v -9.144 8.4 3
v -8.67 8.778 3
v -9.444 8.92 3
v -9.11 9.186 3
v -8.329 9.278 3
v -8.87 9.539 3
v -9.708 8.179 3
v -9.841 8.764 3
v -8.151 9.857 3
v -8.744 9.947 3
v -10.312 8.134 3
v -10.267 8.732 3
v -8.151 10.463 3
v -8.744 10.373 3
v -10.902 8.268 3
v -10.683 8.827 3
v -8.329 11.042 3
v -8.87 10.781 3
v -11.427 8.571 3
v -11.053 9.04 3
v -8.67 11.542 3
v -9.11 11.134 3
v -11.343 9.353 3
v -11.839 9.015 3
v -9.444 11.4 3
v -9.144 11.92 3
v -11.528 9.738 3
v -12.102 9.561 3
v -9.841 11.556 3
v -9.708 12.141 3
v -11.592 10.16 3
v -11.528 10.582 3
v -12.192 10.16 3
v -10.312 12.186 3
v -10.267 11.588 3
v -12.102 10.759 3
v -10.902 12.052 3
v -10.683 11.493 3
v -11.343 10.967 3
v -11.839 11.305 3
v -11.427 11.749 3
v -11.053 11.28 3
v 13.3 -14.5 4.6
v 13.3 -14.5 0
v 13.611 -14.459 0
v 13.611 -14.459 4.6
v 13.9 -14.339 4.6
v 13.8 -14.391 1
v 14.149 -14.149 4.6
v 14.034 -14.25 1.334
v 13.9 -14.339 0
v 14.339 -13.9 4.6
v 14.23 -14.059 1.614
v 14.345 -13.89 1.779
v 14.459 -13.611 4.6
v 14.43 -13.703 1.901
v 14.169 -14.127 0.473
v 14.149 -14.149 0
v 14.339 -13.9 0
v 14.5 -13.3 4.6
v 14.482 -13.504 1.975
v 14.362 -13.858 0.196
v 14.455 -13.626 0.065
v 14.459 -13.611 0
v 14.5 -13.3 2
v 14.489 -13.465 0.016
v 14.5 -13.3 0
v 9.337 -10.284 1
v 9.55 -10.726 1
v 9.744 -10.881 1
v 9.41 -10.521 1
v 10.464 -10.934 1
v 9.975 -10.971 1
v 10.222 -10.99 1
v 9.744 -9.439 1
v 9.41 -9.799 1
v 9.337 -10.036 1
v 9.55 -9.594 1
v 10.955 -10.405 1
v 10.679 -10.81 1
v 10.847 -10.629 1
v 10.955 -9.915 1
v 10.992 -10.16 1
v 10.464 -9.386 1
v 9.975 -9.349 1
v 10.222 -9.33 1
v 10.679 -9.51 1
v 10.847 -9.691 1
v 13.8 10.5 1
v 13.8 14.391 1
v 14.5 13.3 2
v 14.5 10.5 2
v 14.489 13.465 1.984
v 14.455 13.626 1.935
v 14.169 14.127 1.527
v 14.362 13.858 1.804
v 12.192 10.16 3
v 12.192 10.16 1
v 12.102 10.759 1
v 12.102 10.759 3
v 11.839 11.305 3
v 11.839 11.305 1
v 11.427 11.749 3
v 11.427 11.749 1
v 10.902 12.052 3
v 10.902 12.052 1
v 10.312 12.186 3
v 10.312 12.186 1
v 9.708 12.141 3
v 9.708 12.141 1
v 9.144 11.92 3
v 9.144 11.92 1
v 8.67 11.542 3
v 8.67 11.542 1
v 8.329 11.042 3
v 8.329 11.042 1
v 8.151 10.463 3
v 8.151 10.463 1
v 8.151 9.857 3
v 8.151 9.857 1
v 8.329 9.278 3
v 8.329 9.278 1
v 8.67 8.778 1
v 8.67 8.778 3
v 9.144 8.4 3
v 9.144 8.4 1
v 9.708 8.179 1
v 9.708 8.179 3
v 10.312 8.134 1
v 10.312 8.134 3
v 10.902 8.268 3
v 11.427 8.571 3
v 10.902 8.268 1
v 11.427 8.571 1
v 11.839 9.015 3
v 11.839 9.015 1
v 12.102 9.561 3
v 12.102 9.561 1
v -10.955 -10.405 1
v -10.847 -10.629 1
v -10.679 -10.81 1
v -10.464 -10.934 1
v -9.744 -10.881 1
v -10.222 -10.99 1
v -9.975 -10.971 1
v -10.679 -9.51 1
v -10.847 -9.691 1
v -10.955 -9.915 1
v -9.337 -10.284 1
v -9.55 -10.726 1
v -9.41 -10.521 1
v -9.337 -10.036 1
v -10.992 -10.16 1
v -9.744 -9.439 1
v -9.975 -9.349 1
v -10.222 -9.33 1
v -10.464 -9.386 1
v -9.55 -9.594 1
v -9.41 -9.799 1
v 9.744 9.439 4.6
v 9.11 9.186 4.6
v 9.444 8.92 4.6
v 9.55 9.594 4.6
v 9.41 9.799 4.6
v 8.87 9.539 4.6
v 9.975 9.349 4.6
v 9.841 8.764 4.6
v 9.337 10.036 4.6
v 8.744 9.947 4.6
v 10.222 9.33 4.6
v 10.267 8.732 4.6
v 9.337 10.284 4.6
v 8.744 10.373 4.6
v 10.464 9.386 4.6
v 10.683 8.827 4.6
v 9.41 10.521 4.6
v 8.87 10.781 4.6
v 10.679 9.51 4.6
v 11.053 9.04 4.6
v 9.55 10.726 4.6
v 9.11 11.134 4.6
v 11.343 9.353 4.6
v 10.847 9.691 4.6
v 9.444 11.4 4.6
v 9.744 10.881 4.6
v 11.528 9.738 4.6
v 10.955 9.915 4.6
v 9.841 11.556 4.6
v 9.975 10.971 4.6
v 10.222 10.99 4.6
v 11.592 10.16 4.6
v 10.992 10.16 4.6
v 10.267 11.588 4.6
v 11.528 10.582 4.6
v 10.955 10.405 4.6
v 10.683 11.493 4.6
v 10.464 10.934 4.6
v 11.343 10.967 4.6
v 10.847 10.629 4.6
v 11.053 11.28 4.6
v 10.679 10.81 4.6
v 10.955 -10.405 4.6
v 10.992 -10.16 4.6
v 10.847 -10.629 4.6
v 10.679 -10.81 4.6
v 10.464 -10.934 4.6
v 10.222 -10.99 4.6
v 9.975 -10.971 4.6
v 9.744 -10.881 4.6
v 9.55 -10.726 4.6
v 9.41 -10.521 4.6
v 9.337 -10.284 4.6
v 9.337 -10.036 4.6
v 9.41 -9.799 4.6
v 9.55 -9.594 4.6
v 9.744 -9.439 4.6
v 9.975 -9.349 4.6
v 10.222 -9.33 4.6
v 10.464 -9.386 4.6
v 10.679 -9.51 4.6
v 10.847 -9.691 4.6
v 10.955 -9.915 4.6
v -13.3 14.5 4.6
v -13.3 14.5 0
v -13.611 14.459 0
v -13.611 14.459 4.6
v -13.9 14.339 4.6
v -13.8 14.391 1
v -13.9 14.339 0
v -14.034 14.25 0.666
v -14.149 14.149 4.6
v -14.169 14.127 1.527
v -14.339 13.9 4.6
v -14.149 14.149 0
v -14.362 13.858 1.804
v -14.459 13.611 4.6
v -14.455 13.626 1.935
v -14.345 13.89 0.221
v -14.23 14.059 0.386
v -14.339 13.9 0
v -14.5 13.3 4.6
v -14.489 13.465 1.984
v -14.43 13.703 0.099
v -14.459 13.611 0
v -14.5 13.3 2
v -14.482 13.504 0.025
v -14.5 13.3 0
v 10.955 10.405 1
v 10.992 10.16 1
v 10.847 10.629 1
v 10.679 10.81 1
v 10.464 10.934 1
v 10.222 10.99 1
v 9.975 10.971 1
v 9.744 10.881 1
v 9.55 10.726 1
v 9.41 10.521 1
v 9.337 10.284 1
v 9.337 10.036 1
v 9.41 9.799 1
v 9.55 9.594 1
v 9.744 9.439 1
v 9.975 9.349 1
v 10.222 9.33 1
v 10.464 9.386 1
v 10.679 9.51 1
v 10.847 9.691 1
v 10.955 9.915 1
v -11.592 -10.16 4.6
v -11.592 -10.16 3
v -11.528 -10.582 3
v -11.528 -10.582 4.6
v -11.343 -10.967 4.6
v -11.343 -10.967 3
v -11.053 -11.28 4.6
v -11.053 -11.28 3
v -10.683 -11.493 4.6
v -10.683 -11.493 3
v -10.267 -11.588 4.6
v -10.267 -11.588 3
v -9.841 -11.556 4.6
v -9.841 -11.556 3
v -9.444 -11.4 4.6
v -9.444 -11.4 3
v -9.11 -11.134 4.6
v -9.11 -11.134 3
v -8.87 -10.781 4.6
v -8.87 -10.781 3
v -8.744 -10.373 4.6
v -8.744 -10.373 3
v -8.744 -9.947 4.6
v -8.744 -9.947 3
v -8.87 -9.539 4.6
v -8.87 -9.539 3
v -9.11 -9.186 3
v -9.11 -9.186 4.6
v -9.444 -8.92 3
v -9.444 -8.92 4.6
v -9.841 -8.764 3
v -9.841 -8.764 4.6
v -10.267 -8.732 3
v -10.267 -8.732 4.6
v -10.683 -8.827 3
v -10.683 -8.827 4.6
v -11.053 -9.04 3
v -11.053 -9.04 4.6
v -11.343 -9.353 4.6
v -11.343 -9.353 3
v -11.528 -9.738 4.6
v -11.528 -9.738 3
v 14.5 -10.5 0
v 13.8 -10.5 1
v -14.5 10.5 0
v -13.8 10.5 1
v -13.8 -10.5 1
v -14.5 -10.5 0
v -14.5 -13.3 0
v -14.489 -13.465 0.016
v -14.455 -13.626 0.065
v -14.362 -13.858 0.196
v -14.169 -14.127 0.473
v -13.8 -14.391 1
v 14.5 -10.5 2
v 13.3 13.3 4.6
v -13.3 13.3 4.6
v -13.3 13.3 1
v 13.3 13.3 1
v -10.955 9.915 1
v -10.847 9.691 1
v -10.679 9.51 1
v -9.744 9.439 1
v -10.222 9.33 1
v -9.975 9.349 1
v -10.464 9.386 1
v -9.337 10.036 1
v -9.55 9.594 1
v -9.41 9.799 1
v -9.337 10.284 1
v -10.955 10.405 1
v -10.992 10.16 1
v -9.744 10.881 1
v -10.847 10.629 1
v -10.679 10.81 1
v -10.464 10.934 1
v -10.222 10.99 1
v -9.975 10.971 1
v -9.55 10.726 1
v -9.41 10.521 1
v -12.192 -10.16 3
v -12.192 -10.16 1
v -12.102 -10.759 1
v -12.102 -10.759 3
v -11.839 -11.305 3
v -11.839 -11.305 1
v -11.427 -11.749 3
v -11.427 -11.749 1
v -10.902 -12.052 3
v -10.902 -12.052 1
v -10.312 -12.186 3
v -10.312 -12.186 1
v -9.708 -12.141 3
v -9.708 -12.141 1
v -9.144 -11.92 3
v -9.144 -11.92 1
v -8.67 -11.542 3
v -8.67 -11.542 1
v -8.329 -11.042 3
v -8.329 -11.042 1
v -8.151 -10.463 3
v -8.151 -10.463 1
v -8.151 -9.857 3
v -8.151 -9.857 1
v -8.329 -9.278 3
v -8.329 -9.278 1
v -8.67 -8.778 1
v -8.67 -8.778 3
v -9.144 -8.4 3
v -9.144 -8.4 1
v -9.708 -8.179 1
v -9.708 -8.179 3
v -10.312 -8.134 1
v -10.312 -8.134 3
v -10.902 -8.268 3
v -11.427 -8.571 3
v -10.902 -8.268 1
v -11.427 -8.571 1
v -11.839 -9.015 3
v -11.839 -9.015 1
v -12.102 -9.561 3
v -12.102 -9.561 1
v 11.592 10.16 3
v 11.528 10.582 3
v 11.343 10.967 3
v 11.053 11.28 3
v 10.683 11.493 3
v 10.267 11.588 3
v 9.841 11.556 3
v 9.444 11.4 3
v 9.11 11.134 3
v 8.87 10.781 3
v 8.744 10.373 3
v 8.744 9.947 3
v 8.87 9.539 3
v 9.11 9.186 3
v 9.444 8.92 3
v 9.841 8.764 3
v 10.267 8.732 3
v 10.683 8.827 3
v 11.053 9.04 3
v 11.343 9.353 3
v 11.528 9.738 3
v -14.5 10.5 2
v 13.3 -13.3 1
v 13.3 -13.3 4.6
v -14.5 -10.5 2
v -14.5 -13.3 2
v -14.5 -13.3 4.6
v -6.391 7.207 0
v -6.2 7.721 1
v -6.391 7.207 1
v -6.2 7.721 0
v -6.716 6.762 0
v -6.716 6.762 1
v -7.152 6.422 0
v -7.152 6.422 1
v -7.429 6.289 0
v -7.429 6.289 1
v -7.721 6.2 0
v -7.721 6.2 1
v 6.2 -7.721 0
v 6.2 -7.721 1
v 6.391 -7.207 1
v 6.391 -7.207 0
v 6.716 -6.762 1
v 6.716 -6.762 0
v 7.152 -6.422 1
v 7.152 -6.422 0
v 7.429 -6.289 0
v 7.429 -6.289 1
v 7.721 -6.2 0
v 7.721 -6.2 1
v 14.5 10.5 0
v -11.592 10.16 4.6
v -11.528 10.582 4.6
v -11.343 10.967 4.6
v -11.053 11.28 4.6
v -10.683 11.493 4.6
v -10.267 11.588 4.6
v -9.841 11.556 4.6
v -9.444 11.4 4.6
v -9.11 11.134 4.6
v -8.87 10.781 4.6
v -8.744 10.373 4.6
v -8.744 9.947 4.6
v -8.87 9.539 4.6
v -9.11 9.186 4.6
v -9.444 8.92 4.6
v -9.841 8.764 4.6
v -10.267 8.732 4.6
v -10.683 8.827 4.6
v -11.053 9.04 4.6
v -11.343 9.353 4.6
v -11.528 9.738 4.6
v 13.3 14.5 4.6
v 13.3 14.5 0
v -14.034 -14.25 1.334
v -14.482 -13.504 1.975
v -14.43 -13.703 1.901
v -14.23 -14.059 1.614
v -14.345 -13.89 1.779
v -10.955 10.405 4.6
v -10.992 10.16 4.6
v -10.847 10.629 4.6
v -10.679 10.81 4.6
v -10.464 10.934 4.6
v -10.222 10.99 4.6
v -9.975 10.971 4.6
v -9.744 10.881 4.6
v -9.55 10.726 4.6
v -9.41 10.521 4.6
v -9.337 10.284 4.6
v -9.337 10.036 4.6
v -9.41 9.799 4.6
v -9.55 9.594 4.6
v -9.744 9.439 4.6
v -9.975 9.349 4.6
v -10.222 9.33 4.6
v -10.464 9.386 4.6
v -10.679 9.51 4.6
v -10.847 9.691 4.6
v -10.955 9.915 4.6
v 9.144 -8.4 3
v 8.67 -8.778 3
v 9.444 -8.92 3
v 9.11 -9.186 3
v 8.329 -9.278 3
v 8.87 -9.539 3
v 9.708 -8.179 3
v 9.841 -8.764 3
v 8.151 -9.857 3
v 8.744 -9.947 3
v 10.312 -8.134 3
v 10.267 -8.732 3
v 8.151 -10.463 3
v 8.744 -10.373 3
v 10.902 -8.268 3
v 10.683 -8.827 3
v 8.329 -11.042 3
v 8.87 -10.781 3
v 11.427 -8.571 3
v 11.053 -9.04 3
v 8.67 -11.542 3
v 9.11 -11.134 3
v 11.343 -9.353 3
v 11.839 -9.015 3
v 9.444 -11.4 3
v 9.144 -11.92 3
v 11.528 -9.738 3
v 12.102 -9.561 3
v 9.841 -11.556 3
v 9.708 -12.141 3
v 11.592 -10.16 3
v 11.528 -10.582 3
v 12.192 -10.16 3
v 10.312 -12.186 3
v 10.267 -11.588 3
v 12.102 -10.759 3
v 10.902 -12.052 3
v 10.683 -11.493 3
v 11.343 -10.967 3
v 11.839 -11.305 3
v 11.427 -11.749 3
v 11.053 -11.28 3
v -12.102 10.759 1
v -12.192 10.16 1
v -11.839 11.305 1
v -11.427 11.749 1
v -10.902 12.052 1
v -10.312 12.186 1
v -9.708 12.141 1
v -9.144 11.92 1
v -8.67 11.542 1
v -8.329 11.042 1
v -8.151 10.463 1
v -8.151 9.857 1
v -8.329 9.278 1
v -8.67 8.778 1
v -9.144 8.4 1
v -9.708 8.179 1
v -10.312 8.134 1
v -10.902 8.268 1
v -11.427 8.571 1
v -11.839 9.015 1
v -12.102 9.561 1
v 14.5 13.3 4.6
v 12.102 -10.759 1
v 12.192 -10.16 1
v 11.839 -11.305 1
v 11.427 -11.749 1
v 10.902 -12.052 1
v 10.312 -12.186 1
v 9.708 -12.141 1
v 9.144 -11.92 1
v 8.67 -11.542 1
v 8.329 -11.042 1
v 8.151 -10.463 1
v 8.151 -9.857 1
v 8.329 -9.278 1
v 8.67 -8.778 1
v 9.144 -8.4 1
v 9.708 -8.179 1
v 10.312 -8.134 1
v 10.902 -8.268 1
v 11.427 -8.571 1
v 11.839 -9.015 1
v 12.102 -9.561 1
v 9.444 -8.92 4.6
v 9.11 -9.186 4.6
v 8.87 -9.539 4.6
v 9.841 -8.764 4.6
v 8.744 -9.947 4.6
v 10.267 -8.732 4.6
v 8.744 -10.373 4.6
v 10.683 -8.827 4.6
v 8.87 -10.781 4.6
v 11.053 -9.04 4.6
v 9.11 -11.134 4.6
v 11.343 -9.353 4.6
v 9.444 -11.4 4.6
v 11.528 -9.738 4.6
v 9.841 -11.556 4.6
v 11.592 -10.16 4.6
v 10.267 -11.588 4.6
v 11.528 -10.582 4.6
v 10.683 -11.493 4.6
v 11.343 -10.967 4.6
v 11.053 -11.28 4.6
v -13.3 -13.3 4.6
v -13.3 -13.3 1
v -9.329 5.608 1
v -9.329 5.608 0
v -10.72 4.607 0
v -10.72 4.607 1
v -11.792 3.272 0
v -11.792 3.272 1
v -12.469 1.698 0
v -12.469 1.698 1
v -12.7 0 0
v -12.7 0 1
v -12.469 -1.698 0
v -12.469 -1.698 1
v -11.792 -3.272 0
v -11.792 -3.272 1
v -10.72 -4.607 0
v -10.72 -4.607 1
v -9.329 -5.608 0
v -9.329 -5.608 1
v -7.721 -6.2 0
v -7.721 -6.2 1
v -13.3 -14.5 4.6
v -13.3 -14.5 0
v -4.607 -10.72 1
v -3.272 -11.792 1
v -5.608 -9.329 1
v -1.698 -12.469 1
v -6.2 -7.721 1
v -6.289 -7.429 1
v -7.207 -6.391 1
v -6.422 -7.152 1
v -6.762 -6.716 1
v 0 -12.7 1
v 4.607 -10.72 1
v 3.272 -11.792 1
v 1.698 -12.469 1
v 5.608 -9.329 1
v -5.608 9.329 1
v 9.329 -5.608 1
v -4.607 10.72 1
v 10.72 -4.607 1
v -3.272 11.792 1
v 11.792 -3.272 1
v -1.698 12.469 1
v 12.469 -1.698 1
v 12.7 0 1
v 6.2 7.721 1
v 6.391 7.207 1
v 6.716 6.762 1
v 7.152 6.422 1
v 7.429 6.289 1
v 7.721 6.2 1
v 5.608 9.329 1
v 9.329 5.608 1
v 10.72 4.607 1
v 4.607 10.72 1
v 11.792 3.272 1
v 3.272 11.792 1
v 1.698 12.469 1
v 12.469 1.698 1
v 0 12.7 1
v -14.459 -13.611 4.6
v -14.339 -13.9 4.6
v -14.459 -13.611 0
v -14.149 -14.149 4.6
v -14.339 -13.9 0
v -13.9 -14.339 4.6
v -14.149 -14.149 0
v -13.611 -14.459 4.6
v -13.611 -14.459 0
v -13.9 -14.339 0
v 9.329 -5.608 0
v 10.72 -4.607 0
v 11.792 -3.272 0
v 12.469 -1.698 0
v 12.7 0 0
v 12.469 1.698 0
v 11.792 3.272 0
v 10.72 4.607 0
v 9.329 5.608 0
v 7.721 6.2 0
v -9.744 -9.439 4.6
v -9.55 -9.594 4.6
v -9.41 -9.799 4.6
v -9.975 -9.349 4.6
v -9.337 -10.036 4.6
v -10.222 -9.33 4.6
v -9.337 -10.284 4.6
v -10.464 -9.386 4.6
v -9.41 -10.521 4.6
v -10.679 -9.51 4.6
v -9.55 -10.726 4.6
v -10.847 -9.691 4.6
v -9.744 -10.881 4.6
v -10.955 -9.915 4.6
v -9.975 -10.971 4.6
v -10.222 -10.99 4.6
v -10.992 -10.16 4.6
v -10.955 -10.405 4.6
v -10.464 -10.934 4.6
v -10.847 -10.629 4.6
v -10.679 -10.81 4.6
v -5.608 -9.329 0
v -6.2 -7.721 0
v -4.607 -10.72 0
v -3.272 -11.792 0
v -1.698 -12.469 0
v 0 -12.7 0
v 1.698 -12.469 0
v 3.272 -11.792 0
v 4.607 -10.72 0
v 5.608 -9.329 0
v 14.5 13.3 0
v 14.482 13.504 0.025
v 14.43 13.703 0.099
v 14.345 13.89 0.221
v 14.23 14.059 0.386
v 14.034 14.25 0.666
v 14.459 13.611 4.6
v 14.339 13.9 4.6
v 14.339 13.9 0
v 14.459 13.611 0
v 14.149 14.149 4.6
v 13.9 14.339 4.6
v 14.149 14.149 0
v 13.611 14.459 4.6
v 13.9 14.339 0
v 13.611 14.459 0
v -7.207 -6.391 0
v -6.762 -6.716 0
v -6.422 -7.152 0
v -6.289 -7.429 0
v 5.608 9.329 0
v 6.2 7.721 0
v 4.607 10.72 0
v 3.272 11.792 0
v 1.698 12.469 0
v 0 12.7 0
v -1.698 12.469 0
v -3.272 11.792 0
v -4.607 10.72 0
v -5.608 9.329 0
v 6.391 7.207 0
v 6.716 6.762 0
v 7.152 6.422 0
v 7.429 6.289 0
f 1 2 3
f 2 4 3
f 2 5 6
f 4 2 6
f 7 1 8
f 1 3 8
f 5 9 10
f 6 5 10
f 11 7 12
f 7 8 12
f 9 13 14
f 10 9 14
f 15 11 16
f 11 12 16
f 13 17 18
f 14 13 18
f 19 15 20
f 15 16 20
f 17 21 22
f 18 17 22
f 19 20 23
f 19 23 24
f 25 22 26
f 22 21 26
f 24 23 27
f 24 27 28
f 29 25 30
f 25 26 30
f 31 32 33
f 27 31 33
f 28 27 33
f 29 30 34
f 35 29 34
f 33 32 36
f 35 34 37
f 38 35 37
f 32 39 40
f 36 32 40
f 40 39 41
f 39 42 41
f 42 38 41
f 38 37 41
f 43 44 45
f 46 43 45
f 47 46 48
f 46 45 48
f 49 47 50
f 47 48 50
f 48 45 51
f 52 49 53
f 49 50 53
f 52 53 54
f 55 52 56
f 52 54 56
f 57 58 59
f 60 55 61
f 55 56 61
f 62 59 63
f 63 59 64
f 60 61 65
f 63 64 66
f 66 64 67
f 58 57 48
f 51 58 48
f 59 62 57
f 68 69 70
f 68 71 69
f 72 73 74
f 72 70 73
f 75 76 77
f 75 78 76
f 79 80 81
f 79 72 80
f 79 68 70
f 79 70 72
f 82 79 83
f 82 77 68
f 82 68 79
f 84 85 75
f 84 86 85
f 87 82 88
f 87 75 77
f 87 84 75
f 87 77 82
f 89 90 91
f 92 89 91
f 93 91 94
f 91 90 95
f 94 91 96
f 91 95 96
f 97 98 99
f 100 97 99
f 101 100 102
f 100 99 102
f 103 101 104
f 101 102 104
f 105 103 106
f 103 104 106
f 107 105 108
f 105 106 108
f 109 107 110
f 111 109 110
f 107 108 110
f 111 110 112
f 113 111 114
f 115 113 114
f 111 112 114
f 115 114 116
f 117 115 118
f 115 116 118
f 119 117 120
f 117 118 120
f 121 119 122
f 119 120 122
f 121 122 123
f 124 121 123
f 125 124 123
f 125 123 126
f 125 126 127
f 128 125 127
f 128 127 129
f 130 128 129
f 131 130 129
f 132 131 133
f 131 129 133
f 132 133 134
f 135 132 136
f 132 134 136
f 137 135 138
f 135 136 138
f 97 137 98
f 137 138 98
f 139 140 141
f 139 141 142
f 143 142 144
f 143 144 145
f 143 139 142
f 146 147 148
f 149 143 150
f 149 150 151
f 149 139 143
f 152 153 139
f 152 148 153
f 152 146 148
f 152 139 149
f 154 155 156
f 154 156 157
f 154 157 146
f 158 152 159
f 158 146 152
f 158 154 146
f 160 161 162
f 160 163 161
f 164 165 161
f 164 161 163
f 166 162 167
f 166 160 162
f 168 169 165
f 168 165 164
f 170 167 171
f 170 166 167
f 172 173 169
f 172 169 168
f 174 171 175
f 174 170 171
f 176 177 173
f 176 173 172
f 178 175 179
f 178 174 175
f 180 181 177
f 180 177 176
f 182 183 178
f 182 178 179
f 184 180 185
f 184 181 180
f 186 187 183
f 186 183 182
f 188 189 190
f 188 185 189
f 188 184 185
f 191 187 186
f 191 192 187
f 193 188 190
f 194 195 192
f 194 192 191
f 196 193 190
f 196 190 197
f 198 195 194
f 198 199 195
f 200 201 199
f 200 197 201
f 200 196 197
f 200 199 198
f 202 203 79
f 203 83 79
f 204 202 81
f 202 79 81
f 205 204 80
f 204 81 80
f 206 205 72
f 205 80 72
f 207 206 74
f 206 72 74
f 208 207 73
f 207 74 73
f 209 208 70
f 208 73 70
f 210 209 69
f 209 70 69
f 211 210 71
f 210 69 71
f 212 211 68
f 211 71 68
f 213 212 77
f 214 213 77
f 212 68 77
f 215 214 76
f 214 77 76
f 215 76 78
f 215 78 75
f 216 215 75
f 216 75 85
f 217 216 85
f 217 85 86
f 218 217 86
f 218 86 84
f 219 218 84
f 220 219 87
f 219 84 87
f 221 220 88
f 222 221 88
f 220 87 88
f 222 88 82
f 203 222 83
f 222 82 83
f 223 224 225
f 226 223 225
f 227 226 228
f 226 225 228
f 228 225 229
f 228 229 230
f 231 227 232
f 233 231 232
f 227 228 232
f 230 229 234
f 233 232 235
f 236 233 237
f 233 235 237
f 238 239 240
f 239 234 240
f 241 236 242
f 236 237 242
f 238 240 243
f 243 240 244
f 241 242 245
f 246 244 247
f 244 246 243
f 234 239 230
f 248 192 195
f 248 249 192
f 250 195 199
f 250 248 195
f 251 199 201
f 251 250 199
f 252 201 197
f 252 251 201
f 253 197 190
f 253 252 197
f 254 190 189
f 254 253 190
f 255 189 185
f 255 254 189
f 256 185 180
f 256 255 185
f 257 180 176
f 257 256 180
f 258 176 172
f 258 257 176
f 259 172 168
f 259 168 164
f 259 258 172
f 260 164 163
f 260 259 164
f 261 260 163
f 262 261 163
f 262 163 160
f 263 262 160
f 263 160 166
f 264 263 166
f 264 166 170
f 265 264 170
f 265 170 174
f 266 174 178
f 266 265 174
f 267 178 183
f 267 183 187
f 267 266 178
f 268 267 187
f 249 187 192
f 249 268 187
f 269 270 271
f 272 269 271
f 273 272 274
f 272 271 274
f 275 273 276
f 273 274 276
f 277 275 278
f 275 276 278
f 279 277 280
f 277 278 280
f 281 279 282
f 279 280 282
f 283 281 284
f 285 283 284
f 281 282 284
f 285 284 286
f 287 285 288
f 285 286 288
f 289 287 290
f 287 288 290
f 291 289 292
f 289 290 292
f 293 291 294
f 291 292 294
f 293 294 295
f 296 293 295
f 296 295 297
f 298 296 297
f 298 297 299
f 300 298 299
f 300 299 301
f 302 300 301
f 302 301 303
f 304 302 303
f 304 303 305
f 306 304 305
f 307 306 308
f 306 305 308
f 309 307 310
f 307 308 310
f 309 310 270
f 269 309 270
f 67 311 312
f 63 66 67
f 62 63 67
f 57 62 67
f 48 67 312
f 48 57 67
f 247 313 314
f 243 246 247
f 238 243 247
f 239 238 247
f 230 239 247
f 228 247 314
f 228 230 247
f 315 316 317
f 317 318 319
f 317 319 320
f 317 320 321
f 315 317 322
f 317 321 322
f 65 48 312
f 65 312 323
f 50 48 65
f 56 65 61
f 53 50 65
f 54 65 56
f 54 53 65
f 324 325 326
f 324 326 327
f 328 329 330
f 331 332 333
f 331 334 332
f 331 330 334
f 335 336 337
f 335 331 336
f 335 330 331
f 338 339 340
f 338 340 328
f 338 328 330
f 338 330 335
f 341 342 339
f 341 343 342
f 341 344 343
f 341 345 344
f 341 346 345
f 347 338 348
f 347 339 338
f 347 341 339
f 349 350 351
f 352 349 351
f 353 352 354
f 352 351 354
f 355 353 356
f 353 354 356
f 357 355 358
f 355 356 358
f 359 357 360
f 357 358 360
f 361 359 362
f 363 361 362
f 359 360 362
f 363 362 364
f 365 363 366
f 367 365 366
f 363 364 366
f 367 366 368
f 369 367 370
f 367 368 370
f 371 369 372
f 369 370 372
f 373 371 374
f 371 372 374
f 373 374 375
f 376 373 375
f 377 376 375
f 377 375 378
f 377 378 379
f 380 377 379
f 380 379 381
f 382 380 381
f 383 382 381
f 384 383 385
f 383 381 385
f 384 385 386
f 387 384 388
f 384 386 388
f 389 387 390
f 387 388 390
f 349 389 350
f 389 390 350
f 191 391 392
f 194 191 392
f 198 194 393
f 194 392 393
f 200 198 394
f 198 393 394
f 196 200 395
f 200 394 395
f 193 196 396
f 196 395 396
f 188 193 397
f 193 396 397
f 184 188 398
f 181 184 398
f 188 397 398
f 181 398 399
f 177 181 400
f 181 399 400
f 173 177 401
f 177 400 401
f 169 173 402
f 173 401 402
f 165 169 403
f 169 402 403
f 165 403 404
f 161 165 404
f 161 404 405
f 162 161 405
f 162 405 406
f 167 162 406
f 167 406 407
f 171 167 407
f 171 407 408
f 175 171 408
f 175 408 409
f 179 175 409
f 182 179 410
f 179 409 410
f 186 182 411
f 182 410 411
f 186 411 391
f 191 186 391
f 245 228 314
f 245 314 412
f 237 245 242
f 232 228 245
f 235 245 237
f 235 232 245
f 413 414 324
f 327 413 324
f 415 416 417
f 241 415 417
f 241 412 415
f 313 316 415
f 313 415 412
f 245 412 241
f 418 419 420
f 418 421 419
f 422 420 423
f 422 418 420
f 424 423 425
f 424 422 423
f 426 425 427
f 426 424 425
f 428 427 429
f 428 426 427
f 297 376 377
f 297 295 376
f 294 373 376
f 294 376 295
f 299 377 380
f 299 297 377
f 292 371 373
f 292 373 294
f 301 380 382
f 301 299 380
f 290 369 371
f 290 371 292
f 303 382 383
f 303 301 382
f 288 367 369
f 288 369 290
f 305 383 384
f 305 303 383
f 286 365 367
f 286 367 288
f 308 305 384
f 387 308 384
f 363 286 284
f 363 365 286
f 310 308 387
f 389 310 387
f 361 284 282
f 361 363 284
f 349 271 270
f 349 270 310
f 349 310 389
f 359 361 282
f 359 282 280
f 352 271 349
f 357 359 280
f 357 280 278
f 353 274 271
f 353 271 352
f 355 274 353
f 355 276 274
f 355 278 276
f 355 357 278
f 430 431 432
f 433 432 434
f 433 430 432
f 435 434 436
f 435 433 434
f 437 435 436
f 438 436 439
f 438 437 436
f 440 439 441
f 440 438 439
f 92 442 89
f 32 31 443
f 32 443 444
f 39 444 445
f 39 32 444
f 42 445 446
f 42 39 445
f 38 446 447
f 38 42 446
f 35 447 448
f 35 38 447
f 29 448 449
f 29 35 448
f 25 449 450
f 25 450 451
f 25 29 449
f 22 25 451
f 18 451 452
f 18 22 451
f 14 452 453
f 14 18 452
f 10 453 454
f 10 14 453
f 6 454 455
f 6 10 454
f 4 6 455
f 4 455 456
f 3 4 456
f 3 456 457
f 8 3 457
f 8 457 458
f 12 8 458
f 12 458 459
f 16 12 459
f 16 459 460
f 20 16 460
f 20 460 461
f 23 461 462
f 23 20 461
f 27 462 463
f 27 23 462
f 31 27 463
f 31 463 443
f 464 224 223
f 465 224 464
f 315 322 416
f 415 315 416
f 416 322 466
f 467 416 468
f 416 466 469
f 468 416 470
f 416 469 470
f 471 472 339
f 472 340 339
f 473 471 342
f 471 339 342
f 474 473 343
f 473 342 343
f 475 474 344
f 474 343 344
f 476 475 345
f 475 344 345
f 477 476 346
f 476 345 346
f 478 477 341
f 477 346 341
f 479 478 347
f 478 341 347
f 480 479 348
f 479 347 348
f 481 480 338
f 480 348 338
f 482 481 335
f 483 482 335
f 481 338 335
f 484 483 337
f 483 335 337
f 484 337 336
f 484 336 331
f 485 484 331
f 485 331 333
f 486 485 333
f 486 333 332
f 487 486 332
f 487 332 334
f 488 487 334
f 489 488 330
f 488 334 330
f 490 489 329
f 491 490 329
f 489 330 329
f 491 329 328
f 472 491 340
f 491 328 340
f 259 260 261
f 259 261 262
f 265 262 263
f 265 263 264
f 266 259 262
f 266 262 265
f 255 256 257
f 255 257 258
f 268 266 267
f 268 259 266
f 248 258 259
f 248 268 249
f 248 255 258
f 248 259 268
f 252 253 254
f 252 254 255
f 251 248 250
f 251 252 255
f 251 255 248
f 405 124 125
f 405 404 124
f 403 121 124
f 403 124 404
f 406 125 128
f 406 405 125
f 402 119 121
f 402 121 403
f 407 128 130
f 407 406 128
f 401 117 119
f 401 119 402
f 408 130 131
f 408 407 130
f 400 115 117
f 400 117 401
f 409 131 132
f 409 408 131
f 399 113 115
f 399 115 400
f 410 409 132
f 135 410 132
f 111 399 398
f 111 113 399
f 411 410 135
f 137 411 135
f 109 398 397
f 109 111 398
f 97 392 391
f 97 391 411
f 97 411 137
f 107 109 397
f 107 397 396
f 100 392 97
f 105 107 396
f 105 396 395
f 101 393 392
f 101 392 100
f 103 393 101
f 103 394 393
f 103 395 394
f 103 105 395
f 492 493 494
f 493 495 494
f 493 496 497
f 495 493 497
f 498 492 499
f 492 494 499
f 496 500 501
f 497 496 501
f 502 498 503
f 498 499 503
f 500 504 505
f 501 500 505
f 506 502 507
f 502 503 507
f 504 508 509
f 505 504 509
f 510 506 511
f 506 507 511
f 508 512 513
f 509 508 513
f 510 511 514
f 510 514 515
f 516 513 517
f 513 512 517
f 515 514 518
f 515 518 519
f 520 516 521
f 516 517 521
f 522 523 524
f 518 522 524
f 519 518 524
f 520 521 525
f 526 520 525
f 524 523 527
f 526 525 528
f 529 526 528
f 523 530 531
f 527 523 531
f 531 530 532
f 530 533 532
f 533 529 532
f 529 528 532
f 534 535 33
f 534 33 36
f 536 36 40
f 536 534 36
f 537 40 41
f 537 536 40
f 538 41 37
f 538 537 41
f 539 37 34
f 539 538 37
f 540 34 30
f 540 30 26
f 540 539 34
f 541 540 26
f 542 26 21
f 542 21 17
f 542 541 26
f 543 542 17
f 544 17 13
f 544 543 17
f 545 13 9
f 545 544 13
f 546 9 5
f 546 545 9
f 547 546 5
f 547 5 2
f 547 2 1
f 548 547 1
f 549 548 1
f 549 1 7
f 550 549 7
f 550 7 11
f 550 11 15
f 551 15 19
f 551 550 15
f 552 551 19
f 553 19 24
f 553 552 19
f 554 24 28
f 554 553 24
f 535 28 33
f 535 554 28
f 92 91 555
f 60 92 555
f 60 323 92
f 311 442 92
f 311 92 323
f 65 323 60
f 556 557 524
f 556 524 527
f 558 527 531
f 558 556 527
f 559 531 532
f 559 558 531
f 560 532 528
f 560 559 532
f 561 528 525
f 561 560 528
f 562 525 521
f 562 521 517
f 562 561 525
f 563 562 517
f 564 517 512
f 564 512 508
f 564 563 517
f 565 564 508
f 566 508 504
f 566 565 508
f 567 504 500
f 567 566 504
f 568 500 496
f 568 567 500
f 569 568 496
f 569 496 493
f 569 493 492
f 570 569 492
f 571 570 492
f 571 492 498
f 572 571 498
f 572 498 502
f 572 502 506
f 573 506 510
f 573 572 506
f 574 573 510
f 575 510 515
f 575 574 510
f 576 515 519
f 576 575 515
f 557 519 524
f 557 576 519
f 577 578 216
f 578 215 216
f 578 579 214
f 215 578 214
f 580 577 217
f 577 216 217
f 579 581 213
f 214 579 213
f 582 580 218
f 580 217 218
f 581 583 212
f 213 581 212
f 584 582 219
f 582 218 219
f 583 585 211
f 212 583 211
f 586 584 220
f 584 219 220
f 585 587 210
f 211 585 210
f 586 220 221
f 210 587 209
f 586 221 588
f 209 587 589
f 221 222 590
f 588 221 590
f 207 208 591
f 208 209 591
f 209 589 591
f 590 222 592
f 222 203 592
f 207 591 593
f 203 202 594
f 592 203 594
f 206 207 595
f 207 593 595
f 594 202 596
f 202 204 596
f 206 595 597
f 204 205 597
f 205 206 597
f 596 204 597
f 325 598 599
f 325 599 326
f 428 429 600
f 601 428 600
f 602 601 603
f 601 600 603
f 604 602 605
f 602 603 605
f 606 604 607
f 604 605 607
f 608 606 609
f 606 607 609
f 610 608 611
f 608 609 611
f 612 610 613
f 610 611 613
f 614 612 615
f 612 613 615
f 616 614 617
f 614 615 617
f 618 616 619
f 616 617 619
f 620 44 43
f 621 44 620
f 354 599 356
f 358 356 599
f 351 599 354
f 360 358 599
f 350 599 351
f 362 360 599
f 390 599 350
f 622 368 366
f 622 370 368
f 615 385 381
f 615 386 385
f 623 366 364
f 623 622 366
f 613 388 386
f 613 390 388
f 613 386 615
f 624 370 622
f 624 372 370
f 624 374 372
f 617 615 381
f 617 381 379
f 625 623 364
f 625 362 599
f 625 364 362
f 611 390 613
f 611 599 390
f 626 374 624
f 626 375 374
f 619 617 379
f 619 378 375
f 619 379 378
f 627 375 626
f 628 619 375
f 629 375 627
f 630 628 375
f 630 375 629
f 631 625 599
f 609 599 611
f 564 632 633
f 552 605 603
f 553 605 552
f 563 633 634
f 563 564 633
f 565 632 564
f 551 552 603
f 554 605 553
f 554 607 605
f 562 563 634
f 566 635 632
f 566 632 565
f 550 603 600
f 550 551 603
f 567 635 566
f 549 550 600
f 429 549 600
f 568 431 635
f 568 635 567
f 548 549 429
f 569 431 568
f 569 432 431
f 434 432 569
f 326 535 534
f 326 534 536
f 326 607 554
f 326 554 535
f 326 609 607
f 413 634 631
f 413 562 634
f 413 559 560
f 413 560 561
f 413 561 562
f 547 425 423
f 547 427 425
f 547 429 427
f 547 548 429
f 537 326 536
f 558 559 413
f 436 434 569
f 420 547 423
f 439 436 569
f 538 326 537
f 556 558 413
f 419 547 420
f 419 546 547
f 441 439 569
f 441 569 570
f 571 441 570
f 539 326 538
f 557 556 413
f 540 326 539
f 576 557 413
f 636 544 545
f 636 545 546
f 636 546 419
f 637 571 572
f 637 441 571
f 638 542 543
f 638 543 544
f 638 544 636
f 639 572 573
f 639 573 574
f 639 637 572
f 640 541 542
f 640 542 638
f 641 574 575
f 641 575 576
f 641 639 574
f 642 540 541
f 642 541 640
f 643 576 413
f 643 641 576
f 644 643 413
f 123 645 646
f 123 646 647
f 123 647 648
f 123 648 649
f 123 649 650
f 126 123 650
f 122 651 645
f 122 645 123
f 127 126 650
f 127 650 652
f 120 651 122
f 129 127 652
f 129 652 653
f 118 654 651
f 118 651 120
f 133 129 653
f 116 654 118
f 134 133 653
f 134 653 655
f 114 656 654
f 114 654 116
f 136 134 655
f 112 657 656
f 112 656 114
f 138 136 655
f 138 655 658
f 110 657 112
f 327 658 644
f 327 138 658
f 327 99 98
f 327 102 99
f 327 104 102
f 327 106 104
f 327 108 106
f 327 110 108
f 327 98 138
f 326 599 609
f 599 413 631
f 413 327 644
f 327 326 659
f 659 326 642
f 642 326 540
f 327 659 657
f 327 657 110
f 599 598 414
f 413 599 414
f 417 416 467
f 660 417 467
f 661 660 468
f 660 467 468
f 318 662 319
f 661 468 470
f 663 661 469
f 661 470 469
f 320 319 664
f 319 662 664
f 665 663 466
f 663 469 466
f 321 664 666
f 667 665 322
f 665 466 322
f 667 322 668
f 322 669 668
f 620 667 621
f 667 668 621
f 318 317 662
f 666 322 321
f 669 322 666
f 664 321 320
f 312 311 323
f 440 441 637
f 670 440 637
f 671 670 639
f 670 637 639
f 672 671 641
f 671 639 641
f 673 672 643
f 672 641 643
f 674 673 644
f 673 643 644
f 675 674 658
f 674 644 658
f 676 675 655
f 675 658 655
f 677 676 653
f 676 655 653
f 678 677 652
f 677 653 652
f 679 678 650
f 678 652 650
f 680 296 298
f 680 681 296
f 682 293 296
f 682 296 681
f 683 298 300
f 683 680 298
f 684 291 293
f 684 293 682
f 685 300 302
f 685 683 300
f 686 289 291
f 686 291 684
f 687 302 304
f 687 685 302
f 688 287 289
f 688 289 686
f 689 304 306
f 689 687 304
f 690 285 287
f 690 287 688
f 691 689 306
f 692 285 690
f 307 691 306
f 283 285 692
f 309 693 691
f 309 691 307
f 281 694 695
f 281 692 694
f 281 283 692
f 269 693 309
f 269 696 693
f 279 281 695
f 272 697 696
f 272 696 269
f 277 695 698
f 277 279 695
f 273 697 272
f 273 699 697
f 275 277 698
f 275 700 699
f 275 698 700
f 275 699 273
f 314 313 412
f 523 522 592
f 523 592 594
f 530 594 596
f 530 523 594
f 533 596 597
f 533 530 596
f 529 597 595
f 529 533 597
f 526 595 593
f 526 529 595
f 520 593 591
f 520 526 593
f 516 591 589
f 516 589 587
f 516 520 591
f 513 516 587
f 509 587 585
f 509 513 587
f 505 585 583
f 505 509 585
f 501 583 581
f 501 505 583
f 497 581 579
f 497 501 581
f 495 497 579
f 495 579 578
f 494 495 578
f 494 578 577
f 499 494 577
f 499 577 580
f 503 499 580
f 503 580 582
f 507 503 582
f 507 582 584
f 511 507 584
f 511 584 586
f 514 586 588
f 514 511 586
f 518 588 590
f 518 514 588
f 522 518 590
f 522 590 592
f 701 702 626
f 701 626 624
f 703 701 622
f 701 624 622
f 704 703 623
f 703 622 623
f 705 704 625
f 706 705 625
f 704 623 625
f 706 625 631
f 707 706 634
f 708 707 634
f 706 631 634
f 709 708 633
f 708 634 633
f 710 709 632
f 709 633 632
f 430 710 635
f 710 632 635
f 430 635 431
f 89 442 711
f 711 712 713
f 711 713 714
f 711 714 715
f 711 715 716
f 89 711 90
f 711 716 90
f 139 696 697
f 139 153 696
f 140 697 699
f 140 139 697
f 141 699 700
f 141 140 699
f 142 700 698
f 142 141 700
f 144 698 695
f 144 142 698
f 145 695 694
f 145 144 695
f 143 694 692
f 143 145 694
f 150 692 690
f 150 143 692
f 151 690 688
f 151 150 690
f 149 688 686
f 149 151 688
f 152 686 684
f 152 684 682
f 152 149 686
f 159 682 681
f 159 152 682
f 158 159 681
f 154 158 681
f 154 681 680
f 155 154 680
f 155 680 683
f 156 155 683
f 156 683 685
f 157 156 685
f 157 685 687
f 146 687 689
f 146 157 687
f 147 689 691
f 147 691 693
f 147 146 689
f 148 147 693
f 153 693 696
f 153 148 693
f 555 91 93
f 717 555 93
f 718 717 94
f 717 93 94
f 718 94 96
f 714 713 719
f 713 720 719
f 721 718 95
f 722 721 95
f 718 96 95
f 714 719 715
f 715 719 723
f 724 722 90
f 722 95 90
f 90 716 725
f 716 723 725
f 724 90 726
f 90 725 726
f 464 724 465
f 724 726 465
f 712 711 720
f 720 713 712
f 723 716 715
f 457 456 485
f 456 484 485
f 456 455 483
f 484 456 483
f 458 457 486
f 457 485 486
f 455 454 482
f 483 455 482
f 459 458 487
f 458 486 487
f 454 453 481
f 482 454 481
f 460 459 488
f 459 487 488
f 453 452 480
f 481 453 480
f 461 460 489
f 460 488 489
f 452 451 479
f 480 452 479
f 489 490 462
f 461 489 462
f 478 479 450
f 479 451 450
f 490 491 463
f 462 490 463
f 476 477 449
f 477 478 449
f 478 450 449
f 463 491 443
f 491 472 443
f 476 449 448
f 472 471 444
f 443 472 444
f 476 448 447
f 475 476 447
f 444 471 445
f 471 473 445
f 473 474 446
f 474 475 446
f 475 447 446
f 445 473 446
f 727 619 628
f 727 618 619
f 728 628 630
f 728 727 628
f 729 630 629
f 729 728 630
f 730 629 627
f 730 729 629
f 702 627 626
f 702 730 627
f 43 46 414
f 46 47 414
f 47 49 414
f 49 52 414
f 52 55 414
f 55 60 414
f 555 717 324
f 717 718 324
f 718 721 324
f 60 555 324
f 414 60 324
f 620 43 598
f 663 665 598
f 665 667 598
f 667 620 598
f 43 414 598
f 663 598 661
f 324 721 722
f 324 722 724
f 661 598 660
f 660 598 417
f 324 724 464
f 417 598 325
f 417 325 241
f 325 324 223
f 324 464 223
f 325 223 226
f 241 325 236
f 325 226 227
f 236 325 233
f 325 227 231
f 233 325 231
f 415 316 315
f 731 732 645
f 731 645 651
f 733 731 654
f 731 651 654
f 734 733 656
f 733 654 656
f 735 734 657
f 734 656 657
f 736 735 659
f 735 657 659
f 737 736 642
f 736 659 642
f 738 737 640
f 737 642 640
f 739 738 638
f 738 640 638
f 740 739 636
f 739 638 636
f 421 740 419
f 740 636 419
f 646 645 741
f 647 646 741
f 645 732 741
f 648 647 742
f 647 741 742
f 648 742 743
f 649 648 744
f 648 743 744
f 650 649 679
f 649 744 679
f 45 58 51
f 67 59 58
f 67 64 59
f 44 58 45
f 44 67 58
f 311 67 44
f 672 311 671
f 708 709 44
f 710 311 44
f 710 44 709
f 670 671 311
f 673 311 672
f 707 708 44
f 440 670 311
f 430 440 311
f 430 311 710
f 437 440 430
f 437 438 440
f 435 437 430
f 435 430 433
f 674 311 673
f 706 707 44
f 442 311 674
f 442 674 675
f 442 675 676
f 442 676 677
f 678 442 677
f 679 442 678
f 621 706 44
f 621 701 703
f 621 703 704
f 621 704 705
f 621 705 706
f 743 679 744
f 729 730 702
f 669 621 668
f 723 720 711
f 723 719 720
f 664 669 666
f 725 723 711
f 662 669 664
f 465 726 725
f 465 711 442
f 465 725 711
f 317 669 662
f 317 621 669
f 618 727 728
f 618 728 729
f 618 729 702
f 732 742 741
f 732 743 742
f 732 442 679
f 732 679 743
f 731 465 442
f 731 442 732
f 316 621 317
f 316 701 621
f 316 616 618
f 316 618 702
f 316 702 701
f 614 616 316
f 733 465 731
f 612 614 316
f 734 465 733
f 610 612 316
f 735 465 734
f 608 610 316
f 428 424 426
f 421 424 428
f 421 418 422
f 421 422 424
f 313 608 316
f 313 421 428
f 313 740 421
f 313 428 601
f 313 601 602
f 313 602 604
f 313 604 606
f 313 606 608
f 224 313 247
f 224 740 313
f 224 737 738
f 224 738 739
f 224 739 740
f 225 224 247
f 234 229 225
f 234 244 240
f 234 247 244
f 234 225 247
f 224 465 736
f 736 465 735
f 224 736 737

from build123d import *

# Parameters (mm, degrees)
PAD011_DEPTH                = 4.6
SKETCH016_W                 = 26.6
SKETCH016_H                 = 26.6
POCKET005_DEPTH             = 3.6
SKETCH018_R                 = 2.032
SKETCH018_R_2               = 0.832
PAD012_DEPTH                = 2
SKETCH018_MIRRORED013_2_R   = 2.032
SKETCH018_MIRRORED013_2_R_2 = 0.832
PAD012_MIRRORED013_2_DEPTH  = 2
SKETCH_R                    = 1.432
SKETCH_R_2                  = 0.832
PAD_DEPTH                   = 1.6
SKETCH_MIRRORED023_2_R      = 1.432
SKETCH_MIRRORED023_2_R_2    = 0.832
PAD_MIRRORED023_2_DEPTH     = 1.6
POCKET007_DEPTH             = 1.001
POCKET009_DEPTH             = 4
POCKET009_MIRRORED_2_DEPTH  = 4
FILLET014_R                 = 2


with BuildPart() as part:
    # Sketch015 → Pad011 (new body)
    with BuildSketch(Plane.XY):
        with BuildLine():
            Line((-13.3, 14.5), (13.3, 14.5))
            ThreePointArc((14.5, 13.3), (14.148528, 14.148528), (13.3, 14.5))
            Line((14.5, 13.3), (14.5, -13.3))
            ThreePointArc((13.3, -14.5), (14.148528, -14.148528), (14.5, -13.3))
            Line((13.3, -14.5), (-13.3, -14.5))
            ThreePointArc((-14.5, -13.3), (-14.148528, -14.148528), (-13.3, -14.5))
            Line((-14.5, -13.3), (-14.5, 13.3))
            ThreePointArc((-13.3, 14.5), (-14.148528, 14.148528), (-14.5, 13.3))
        make_face()
    extrude(amount=PAD011_DEPTH)

    # Sketch016 (on Face10 of Pad011) → Pocket005 (cut)
    with BuildSketch(Plane.XY.offset(4.6)):
        Rectangle(SKETCH016_W, SKETCH016_H)
    extrude(amount=-POCKET005_DEPTH, mode=Mode.SUBTRACT)

    # Sketch018 → Pad012 (join)
    with BuildSketch(Plane.XY.offset(1)):
        with Locations((10.16, 10.16)):
            Circle(SKETCH018_R)
        with Locations((10.16, 10.16)):
            Circle(SKETCH018_R_2, mode=Mode.SUBTRACT)
    pad012 = extrude(amount=PAD012_DEPTH)

    # Sketch018 Mirrored013 2 → Pad012 Mirrored013 2 (add)
    with BuildSketch(Plane(origin=(0, 0, 1), x_dir=(-1, 0, 0), z_dir=(0, 0, -1))):
        with Locations((10.16, 10.16)):
            Circle(SKETCH018_MIRRORED013_2_R)
        with Locations((10.16, 10.16)):
            Circle(SKETCH018_MIRRORED013_2_R_2, mode=Mode.SUBTRACT)
    pad012_mirrored013_2 = extrude(amount=-PAD012_MIRRORED013_2_DEPTH)

    # Mirrored014: Pad012, Pad012 Mirrored013 2 across Sketch018 H_Axis
    add(pad012.mirror(Plane(origin=(0, 0, 1), x_dir=(0, 0, 1), z_dir=(0, 1, 0))))
    add(pad012_mirrored013_2.mirror(Plane(origin=(0, 0, 1), x_dir=(0, 0, 1), z_dir=(0, 1, 0))))

    # Sketch (on Face22 of MultiTransform008) → Pad (join)
    with BuildSketch(Plane.XY.offset(3)):
        with Locations((10.16, 10.16)):
            Circle(SKETCH_R)
        with Locations((10.16, 10.16)):
            Circle(SKETCH_R_2, mode=Mode.SUBTRACT)
    pad = extrude(amount=PAD_DEPTH)

    # Sketch Mirrored023 2 → Pad Mirrored023 2 (add)
    with BuildSketch(Plane(origin=(0, 0, 3), x_dir=(-1, 0, 0), z_dir=(0, 0, -1))):
        with Locations((10.16, 10.16)):
            Circle(SKETCH_MIRRORED023_2_R)
        with Locations((10.16, 10.16)):
            Circle(SKETCH_MIRRORED023_2_R_2, mode=Mode.SUBTRACT)
    pad_mirrored023_2 = extrude(amount=-PAD_MIRRORED023_2_DEPTH)

    # Mirrored024: Pad, Pad Mirrored023 2 across Sketch H_Axis
    add(pad.mirror(Plane(origin=(0, 0, 3), x_dir=(0, 0, 1), z_dir=(0, 1, 0))))
    add(pad_mirrored023_2.mirror(Plane(origin=(0, 0, 3), x_dir=(0, 0, 1), z_dir=(0, 1, 0))))

    # Sketch020 (on Face15 of Pocket005) → Pocket007 (cut, through all)
    with BuildSketch(Plane.XY.offset(1)):
        with BuildLine():
            ThreePointArc((6.35, 6.35), (0, 12.7), (-6.35, 6.35))
            ThreePointArc((-6.35, 6.35), (-12.699991, 0), (-6.35, -6.35))
            ThreePointArc((-6.35, -6.35), (0, -12.7), (6.35, -6.35))
            ThreePointArc((6.35, -6.35), (12.7, 0), (6.35, 6.35))
        make_face()
    extrude(amount=-POCKET007_DEPTH, mode=Mode.SUBTRACT)

    # Sketch026 (on Face6 of Pocket007) → Pocket009 (cut)
    with BuildSketch(Plane.XZ.offset(14.5)):
        Polygon((14.5, 0), (13.799792, 1), (14.5, 2), align=None)
    pocket009 = extrude(amount=-POCKET009_DEPTH, mode=Mode.SUBTRACT)

    # Sketch026 Mirrored 2 → Pocket009 Mirrored 2 (cut)
    with BuildSketch(Plane(origin=(0, -14.5, 0), x_dir=(-1, 0, 0), z_dir=(0, 1, 0))):
        Polygon((14.5, 0), (13.799792, 1), (14.5, 2), align=None)
    pocket009_mirrored_2 = extrude(amount=POCKET009_MIRRORED_2_DEPTH, mode=Mode.SUBTRACT)

    # Mirrored022: Pocket009, Pocket009 Mirrored 2 across XZ
    add(pocket009.mirror(Plane.XZ), mode=Mode.SUBTRACT)
    add(pocket009_mirrored_2.mirror(Plane.XZ), mode=Mode.SUBTRACT)

    # Fillet014
    fillet014_edges = [part.edges().sort_by_distance(p)[0] for p in [
        (-6.35, 6.35, 0.5),
        (6.35, 6.35, 0.5),
        (-6.35, -6.35, 0.5),
        (6.35, -6.35, 0.5),
    ]]
    fillet(fillet014_edges, radius=FILLET014_R)


solid = part.part
